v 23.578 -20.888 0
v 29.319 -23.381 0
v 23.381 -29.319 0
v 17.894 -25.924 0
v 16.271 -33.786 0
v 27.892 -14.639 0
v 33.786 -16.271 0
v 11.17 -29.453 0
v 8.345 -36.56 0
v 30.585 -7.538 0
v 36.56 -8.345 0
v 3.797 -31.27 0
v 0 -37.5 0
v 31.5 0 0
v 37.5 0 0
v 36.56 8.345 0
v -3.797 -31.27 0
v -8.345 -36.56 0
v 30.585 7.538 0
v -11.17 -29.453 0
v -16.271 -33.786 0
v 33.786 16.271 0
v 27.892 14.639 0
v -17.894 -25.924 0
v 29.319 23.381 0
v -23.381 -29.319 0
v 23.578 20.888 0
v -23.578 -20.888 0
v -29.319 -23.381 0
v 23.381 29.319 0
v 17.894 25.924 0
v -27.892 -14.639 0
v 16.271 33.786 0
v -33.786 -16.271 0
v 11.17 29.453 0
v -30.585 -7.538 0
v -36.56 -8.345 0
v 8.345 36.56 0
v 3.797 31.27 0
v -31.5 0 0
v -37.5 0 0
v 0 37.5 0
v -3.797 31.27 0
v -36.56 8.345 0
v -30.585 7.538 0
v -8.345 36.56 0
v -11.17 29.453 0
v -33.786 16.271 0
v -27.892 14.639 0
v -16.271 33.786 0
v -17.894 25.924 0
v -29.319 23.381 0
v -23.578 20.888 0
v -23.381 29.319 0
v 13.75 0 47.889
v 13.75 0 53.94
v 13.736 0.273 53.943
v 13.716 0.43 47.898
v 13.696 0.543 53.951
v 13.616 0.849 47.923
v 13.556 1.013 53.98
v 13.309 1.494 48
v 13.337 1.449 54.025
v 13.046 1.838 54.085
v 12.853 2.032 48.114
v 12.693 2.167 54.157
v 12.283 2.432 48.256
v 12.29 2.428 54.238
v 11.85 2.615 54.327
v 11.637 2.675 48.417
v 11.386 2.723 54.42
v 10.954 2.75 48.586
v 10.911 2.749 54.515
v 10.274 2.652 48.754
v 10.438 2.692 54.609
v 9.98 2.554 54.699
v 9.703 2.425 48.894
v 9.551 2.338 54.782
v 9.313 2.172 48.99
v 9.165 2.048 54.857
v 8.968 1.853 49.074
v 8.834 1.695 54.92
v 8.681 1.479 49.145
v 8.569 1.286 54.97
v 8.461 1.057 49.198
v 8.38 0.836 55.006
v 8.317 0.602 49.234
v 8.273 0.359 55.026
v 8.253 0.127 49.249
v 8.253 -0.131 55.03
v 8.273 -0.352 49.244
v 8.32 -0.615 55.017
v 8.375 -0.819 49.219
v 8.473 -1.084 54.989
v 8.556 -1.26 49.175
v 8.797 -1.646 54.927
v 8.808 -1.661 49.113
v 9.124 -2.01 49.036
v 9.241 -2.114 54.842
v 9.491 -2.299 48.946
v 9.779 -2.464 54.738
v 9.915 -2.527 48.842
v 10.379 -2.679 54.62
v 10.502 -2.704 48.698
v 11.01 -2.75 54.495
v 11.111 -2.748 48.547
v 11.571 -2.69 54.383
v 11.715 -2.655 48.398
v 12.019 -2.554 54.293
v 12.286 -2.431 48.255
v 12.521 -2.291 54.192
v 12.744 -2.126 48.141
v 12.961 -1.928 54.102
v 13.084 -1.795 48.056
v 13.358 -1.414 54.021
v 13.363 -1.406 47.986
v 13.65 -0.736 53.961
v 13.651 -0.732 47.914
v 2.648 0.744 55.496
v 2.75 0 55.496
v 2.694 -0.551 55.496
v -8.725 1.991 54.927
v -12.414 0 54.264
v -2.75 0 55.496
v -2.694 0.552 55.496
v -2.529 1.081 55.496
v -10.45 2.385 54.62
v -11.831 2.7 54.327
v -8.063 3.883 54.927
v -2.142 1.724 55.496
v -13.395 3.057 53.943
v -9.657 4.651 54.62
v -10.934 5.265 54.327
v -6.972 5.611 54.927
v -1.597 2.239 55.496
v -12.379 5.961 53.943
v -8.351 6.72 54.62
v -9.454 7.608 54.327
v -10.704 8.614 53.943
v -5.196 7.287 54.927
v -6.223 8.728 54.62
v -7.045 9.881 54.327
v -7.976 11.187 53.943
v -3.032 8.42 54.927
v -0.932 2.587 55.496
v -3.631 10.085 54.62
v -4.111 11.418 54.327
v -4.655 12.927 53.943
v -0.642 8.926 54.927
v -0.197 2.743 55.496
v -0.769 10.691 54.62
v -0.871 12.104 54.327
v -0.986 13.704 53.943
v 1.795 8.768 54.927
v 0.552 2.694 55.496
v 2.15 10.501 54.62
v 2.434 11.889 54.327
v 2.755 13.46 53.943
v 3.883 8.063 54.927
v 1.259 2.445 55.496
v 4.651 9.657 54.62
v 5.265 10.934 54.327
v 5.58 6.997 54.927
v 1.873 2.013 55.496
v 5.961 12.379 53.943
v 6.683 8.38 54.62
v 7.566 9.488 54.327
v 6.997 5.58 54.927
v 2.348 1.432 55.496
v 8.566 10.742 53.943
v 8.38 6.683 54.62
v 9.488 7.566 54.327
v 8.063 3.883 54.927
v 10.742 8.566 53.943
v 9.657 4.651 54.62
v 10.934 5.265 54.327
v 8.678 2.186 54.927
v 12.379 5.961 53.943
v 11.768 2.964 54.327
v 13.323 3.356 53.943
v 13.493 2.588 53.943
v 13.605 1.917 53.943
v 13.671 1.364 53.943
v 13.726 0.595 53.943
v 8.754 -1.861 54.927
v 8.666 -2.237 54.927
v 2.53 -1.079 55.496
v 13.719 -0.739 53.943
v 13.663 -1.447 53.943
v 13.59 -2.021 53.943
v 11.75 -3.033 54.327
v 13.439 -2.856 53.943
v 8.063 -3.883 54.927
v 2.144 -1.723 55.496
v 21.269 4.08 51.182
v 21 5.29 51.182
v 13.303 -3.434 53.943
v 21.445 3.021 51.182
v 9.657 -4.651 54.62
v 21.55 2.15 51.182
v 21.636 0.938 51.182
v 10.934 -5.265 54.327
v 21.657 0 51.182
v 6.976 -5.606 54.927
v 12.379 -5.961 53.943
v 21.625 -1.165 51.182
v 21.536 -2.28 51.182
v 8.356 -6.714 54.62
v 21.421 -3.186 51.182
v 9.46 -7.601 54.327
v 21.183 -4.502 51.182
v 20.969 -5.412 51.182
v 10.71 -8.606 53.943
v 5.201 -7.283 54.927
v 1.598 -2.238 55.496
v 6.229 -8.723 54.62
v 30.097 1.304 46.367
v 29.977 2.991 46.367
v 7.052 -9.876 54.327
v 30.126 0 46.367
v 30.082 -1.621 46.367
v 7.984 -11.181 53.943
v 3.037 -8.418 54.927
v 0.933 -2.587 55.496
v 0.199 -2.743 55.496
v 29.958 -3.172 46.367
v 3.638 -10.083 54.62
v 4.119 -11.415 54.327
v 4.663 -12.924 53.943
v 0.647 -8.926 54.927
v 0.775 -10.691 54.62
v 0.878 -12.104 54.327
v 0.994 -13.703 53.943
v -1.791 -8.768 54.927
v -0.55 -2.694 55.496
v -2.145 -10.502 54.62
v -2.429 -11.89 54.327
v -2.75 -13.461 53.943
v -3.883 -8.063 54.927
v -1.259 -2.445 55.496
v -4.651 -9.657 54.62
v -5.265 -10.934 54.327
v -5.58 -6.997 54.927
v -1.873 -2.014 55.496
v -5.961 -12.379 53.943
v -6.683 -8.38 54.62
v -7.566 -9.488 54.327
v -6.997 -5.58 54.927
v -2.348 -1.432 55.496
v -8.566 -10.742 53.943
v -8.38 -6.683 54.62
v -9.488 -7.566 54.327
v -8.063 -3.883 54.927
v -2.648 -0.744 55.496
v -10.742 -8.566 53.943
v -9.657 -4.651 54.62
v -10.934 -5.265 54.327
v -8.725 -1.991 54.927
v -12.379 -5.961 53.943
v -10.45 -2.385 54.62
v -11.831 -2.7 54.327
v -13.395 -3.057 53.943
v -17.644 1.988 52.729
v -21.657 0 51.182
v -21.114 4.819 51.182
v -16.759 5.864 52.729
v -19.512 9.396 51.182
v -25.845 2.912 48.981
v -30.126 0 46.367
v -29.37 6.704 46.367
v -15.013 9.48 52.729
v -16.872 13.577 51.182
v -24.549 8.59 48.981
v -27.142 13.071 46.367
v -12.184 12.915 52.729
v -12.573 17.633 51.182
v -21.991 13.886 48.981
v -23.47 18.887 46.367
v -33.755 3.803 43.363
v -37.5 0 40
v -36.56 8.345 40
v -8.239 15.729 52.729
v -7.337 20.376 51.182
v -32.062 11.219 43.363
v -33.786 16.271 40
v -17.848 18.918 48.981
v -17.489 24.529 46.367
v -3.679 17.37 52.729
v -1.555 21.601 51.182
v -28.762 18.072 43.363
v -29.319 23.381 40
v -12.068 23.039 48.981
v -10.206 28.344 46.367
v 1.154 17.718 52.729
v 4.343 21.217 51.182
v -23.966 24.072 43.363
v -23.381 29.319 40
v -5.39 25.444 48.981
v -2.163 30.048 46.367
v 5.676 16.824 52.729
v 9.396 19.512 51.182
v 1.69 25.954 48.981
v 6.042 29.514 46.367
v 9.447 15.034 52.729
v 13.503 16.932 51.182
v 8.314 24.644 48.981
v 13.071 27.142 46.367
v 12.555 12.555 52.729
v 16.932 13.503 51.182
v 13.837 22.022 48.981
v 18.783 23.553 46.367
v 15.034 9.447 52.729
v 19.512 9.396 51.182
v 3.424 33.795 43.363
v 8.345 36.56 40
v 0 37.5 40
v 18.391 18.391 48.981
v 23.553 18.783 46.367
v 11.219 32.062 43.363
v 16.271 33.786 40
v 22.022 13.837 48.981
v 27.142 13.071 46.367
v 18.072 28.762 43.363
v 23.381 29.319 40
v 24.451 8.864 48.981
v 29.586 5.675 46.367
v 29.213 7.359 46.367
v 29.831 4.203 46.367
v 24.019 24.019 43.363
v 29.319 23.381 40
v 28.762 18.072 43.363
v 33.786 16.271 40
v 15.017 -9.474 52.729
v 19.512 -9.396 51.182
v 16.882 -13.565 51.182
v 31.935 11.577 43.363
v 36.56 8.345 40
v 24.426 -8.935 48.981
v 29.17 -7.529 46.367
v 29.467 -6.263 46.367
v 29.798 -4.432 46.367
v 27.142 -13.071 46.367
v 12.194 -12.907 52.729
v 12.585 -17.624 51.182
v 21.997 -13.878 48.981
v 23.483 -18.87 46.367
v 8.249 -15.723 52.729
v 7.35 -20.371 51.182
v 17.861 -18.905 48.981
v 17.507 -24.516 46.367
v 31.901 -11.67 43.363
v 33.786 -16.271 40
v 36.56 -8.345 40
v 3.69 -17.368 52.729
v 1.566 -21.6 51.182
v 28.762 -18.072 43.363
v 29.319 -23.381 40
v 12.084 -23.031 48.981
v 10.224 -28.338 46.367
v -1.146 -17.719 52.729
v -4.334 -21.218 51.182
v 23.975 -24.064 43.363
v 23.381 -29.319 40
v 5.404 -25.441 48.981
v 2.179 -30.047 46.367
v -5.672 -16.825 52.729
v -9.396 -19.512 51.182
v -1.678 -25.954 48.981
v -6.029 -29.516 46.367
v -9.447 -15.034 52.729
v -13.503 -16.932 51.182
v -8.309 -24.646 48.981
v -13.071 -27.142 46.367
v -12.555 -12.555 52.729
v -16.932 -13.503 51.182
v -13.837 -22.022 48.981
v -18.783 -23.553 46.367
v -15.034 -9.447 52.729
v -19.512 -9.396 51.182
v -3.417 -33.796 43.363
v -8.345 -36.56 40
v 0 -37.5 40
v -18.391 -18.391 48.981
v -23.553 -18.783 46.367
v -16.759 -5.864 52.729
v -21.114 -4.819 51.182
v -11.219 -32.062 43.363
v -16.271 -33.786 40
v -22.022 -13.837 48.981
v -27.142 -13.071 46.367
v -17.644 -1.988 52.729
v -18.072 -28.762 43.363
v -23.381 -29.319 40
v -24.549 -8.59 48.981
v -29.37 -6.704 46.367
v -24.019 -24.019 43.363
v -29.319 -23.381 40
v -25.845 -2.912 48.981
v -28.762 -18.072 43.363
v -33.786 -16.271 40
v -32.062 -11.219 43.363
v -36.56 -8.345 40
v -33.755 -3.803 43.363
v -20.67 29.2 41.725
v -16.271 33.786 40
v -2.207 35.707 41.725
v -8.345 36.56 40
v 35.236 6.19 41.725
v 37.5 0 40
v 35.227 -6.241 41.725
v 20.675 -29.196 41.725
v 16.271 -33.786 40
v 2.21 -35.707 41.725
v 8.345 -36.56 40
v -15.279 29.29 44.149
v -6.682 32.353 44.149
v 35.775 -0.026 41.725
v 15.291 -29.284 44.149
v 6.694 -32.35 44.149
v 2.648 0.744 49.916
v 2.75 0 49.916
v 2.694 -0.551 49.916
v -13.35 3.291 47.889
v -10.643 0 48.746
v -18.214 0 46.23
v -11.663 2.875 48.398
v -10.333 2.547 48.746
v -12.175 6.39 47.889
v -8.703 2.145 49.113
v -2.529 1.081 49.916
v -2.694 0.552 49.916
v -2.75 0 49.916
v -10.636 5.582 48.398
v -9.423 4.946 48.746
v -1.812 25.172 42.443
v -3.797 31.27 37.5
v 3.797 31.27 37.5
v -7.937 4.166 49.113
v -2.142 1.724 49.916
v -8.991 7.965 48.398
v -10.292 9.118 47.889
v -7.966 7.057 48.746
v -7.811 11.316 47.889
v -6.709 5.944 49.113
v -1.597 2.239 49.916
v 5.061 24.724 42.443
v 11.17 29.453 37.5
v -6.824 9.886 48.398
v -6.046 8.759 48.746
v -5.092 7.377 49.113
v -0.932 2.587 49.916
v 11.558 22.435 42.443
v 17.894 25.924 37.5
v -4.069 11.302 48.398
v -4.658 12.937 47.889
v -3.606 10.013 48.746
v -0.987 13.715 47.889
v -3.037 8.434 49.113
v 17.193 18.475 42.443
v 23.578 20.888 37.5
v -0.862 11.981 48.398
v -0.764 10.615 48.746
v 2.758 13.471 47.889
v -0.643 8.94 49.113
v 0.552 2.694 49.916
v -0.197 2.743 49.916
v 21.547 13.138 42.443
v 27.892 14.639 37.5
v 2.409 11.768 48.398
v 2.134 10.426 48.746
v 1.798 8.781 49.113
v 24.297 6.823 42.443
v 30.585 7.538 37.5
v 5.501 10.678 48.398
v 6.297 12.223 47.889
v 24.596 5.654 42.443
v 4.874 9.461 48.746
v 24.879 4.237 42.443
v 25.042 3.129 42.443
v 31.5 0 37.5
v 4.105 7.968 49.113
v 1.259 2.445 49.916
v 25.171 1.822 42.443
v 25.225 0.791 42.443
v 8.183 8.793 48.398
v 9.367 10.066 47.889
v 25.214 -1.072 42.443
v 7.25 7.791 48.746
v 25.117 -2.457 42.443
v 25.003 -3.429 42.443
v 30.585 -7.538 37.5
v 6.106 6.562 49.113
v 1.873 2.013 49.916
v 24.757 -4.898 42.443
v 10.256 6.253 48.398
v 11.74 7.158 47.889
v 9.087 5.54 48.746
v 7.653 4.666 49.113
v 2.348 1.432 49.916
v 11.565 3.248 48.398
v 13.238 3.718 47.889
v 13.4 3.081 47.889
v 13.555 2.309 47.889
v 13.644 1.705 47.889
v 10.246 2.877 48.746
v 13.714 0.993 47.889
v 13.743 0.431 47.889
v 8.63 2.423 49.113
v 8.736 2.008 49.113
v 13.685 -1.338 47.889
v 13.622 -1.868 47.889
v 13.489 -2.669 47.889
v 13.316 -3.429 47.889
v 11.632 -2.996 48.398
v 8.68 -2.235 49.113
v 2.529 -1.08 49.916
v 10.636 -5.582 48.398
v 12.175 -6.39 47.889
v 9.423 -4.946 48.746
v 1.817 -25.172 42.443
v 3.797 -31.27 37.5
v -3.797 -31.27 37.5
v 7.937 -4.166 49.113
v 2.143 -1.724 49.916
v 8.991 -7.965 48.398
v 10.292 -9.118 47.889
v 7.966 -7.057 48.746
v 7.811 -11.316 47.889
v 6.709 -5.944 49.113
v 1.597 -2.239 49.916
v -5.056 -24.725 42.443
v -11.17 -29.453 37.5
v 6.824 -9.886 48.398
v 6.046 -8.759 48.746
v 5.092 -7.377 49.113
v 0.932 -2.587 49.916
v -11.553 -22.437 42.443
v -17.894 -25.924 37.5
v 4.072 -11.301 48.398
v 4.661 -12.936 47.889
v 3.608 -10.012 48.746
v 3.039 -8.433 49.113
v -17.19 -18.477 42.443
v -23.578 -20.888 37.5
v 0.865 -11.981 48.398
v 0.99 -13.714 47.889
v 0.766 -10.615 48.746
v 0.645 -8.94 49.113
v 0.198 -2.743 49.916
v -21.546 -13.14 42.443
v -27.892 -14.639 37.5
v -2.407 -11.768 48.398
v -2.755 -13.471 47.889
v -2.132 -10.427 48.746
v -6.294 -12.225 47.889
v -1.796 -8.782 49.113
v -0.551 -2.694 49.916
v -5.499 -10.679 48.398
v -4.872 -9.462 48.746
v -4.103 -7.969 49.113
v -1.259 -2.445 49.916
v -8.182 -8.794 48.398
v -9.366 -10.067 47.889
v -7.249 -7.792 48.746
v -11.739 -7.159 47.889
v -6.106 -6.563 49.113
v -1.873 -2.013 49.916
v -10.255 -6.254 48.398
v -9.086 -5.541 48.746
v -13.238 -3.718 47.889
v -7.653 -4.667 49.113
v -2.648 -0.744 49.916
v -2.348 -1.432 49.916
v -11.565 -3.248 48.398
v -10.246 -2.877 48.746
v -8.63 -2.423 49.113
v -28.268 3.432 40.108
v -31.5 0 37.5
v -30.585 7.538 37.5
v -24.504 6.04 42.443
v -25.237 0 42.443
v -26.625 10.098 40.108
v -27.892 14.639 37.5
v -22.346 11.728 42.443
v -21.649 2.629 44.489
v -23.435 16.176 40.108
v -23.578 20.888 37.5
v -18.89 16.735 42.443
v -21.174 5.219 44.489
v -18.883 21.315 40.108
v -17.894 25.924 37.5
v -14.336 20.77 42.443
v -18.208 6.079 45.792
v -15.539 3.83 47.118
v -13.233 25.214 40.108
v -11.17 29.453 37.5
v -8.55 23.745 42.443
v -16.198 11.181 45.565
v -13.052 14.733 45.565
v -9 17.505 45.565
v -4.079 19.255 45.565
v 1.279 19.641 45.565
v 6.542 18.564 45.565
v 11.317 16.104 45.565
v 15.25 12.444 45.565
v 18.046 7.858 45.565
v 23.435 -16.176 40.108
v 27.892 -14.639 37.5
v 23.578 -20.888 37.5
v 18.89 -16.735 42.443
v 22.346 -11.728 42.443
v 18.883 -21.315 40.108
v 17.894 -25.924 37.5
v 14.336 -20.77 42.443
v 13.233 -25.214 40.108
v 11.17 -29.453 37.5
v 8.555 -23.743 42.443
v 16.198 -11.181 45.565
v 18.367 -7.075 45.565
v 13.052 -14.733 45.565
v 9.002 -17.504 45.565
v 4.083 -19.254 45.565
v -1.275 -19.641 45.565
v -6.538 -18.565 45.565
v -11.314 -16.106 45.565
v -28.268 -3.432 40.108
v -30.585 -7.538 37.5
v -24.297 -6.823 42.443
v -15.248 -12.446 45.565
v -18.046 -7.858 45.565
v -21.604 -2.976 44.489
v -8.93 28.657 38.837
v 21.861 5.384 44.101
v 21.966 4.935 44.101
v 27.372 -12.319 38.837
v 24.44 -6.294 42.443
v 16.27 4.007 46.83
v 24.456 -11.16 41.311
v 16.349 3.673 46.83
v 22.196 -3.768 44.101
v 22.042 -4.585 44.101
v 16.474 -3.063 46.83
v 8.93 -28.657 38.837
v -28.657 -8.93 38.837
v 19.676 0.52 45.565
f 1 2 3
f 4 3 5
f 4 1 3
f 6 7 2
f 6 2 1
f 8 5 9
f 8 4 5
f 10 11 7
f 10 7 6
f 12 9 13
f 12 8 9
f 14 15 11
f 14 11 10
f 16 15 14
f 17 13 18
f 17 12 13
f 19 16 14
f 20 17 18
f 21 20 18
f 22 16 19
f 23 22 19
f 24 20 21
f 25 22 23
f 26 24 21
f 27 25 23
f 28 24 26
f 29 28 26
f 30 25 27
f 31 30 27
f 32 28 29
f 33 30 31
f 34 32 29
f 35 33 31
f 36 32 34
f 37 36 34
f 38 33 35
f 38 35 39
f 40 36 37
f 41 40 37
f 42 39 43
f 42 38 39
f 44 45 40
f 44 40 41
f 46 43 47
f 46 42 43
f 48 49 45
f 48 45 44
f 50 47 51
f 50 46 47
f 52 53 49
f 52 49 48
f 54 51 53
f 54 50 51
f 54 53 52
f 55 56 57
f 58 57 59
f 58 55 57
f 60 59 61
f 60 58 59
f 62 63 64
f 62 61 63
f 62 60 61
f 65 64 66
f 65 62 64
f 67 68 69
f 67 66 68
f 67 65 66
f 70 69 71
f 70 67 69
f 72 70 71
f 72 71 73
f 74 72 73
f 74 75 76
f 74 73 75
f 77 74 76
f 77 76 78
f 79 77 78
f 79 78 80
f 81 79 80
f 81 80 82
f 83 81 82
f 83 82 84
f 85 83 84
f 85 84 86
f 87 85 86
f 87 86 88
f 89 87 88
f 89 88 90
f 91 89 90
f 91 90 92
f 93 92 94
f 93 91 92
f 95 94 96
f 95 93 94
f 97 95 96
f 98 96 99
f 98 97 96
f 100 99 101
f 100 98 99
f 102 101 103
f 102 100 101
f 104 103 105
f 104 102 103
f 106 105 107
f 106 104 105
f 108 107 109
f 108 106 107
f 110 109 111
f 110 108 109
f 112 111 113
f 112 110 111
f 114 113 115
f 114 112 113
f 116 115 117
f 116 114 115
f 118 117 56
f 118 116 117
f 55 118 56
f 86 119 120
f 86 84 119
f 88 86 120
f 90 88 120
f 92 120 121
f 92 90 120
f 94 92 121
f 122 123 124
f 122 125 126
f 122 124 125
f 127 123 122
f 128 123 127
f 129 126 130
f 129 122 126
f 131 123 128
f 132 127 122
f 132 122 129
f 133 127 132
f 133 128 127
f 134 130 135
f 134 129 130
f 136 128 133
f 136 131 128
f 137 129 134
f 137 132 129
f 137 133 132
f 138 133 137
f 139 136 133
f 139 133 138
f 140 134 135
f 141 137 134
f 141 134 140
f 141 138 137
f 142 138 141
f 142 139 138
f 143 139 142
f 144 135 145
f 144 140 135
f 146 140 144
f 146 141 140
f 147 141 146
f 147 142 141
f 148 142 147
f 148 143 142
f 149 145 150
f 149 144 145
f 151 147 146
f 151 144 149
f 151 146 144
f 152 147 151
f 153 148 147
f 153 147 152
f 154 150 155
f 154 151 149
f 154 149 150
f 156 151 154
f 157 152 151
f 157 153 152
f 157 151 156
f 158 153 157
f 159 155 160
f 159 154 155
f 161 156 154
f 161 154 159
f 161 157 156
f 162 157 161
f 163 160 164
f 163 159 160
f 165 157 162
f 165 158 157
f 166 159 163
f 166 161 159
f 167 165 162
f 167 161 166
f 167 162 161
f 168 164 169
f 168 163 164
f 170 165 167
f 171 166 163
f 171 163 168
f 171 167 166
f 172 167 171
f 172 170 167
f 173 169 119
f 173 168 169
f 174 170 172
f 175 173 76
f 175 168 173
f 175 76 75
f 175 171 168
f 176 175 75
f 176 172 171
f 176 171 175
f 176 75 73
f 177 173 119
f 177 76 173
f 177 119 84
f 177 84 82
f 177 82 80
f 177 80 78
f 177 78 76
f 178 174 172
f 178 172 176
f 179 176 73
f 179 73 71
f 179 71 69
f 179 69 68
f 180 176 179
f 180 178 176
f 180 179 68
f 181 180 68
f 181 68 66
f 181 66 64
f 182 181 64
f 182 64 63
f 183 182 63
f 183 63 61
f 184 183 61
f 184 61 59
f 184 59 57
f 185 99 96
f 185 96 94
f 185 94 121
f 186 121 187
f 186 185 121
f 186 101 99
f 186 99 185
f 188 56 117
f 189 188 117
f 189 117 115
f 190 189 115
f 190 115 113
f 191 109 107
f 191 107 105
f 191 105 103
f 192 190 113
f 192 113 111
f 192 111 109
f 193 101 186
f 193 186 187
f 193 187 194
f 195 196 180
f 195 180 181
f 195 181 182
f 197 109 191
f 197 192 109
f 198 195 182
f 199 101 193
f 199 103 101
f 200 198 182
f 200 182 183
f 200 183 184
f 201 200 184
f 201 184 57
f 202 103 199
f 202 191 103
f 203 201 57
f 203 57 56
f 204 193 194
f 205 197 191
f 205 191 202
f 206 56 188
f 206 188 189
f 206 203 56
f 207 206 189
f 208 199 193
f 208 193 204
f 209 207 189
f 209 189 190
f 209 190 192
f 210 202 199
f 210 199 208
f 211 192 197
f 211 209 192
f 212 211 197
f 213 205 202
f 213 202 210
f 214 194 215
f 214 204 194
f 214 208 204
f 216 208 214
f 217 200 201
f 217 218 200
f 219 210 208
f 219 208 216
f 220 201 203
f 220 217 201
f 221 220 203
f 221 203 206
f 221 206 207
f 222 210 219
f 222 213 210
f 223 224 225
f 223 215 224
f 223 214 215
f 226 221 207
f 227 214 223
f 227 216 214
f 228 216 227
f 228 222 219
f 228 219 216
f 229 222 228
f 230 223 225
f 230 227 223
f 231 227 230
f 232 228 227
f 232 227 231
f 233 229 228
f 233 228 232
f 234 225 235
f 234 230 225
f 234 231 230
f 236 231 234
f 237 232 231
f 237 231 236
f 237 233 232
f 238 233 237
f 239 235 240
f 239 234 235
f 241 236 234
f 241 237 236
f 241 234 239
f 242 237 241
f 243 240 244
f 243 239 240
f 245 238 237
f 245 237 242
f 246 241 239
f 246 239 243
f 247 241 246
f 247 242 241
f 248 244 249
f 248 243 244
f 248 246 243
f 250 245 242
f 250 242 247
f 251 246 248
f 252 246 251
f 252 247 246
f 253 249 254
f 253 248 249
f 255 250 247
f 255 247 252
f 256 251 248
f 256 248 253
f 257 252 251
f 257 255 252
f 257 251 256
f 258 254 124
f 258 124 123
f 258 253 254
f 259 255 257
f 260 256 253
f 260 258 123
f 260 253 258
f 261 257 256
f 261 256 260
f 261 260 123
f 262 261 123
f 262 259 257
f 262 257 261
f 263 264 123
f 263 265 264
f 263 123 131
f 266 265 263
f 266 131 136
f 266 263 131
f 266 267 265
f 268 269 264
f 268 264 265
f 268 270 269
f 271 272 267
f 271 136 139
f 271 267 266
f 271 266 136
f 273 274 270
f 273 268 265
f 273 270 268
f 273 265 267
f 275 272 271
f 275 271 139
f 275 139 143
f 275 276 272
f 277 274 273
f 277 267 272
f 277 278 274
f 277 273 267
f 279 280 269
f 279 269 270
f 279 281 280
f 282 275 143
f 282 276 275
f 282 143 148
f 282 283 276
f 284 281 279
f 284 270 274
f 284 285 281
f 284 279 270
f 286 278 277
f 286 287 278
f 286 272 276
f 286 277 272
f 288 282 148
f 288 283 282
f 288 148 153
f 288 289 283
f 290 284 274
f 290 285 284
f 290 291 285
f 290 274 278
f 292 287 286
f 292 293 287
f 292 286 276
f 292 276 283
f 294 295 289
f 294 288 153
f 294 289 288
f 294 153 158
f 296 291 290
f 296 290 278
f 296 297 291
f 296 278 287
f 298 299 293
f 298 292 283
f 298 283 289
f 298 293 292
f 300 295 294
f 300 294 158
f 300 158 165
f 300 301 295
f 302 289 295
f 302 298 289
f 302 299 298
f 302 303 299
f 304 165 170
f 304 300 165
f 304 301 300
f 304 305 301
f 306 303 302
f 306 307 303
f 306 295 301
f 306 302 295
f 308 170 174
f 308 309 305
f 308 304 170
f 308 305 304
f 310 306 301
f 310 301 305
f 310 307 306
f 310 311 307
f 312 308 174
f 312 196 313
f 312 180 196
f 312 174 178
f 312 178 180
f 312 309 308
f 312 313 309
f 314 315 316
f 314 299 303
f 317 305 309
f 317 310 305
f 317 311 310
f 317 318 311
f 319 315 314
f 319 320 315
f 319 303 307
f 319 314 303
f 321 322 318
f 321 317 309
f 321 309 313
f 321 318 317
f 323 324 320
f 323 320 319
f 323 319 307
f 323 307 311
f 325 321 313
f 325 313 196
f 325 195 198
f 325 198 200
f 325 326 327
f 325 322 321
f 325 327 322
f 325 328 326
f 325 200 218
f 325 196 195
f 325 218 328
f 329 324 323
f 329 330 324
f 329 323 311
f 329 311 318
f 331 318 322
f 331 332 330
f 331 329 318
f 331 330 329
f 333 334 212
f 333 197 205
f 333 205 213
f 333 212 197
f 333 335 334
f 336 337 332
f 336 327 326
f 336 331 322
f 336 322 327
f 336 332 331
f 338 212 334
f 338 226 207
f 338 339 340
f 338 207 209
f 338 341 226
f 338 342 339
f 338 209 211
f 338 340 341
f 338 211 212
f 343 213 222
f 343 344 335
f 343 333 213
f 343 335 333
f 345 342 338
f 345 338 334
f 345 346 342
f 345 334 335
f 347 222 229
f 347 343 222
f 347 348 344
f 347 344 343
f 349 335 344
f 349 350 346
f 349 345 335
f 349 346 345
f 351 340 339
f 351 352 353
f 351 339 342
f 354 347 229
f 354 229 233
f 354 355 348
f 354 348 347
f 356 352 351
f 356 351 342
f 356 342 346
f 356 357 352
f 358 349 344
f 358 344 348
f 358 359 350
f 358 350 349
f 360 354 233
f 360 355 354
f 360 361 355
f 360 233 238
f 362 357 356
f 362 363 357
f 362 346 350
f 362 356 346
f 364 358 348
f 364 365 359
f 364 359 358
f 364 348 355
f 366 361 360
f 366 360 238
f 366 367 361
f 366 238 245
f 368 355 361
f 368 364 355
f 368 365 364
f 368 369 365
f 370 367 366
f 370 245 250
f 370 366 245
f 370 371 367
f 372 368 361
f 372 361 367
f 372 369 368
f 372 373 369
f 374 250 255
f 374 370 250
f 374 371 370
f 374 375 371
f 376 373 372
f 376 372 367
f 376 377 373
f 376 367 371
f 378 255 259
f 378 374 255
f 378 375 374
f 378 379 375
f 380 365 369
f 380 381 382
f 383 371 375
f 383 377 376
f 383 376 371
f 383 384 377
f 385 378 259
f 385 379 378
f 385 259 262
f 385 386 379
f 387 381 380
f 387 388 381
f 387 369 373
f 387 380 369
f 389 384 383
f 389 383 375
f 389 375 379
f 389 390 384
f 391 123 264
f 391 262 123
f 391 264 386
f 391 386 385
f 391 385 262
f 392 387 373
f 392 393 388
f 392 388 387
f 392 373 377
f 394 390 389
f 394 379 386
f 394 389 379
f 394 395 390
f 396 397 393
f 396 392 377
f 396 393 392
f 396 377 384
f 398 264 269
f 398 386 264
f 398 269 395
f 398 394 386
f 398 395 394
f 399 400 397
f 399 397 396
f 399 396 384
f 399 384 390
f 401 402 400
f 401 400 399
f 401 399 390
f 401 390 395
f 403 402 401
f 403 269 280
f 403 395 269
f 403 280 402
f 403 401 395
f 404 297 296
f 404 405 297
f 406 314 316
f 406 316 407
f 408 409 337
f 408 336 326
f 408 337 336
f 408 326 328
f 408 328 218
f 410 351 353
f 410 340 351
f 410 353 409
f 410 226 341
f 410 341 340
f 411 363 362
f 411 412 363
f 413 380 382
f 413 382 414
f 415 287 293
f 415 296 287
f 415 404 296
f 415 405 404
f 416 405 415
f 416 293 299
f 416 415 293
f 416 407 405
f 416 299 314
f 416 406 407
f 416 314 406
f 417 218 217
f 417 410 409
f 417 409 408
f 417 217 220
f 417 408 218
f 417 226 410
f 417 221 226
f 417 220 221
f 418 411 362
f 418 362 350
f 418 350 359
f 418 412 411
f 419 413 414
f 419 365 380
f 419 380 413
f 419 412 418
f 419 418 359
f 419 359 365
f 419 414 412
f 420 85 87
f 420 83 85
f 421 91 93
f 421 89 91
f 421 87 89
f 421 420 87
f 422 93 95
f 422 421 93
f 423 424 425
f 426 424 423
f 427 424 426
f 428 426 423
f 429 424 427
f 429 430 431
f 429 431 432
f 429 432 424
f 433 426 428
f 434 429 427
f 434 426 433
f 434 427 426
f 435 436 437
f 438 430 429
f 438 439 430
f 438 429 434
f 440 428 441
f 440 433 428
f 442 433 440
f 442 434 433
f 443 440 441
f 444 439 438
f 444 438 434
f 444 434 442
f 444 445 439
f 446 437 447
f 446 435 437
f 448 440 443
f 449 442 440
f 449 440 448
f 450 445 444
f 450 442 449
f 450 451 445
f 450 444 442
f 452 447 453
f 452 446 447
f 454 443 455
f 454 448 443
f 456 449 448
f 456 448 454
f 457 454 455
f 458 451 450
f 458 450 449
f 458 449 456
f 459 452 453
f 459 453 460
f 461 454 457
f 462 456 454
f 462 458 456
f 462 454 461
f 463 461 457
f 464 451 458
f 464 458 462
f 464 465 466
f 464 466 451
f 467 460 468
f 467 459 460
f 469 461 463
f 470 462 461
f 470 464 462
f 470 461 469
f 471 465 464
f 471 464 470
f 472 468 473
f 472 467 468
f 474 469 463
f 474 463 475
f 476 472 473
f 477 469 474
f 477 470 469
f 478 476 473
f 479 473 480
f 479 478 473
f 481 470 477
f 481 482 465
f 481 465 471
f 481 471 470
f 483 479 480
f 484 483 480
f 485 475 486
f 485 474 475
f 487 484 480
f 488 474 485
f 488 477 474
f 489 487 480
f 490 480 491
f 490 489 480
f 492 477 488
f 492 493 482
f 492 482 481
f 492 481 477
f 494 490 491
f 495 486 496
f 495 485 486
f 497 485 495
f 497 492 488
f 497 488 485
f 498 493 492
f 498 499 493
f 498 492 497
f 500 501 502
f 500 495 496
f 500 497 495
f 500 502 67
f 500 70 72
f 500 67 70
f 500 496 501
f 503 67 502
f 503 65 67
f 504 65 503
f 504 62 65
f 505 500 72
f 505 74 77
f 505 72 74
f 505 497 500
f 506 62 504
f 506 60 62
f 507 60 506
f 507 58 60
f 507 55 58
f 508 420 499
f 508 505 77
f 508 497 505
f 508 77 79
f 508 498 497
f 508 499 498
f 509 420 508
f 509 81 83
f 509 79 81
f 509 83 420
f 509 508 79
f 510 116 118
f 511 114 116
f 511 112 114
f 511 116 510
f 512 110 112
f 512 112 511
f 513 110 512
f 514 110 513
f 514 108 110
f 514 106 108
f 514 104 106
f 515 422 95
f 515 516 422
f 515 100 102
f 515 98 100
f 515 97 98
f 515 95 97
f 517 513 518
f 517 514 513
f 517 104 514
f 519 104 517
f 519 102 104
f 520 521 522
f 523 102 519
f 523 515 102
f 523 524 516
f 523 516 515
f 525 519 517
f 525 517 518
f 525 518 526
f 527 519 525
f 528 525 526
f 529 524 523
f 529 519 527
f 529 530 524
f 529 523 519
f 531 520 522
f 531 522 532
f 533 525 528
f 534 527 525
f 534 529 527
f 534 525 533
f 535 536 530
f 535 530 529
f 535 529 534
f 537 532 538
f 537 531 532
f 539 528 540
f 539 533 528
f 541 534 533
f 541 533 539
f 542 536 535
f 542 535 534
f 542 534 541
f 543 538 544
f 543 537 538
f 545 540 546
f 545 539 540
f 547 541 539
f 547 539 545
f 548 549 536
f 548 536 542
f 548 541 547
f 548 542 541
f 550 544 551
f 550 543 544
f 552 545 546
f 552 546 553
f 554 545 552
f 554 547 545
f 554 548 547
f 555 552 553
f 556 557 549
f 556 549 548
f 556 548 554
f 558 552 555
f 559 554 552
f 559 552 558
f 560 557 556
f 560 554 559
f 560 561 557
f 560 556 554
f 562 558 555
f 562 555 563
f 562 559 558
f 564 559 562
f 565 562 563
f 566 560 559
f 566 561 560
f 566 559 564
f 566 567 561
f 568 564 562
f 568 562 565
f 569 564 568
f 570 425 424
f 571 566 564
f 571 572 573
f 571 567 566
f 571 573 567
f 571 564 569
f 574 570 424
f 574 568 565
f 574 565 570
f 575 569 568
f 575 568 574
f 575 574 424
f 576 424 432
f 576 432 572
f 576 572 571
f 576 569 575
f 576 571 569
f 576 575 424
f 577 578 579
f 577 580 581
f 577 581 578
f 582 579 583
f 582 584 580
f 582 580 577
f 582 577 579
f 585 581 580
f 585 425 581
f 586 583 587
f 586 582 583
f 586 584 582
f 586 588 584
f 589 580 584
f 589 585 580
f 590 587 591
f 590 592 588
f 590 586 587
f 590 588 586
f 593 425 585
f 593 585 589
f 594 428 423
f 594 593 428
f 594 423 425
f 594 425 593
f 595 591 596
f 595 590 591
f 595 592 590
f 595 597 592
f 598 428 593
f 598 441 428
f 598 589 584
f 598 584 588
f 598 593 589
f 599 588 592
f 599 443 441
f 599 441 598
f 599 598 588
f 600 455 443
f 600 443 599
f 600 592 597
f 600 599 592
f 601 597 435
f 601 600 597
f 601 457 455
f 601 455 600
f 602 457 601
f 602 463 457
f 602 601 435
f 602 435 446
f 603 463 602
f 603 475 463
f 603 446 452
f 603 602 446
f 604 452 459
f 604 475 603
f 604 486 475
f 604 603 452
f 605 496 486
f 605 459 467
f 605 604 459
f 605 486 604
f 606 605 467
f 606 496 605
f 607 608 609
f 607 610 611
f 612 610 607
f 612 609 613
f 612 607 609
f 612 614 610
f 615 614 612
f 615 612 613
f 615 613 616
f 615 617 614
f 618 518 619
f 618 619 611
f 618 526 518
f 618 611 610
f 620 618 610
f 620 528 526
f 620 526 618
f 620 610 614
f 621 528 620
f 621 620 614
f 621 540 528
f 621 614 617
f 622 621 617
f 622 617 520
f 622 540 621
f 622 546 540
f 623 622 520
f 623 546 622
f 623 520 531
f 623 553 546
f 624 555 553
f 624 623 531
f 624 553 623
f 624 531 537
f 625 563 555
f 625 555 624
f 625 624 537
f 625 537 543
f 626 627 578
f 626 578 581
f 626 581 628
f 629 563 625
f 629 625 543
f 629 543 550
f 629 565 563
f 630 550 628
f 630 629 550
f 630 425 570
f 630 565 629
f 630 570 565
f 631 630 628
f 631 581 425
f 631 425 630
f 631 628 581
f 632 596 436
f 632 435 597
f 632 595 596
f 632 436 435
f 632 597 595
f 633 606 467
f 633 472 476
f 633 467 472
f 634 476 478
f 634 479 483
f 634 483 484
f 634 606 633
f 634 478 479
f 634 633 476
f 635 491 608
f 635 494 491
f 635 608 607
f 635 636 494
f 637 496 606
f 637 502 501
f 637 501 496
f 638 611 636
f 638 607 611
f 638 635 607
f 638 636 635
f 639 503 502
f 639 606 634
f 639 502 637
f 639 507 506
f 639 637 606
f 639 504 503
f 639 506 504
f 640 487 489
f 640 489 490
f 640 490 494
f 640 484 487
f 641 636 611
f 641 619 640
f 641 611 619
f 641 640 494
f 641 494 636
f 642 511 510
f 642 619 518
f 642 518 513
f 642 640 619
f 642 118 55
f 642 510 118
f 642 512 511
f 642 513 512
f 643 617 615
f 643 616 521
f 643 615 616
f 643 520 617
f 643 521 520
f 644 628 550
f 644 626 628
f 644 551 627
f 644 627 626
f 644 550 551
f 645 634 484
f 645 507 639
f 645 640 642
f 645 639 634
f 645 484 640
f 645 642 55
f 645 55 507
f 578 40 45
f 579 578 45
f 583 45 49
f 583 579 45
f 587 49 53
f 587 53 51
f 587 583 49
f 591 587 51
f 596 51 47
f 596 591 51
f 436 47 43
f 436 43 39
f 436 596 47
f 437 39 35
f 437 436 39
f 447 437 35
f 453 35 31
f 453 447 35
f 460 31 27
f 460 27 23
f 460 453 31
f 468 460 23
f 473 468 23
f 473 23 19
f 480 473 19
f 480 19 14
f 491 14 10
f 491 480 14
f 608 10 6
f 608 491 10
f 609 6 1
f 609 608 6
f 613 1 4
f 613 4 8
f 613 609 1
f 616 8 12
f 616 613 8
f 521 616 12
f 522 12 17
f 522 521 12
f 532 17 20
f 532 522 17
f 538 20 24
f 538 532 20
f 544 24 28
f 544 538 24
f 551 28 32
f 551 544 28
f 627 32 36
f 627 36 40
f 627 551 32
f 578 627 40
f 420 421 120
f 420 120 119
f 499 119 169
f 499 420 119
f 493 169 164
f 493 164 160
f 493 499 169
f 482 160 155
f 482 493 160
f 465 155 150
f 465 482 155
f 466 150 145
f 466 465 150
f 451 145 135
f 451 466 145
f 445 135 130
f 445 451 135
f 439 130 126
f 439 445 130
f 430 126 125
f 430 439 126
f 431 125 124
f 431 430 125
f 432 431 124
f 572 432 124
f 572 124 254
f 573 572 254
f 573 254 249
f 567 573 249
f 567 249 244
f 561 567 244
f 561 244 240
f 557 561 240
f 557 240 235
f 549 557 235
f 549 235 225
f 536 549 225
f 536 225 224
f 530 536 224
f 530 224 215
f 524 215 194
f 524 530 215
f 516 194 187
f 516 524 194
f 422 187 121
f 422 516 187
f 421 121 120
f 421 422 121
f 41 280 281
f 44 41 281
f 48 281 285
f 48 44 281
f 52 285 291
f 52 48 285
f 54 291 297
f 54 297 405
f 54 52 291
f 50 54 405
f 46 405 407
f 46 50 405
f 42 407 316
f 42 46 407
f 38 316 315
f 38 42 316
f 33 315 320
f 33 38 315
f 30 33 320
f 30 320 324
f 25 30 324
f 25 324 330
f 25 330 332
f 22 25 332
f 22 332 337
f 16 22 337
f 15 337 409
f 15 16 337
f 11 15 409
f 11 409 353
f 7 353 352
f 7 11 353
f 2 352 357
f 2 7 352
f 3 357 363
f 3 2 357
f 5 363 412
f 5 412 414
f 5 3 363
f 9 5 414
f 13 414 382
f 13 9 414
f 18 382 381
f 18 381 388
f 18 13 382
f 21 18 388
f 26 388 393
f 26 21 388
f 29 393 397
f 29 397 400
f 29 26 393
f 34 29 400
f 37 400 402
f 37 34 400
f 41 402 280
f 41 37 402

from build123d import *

# Parameters (mm, degrees)
F2_R     = 2.75
F3_DEPTH = 60
F4_R     = 2.75
F5_DEPTH = 60


with BuildPart() as f1:
    # F0 (on Front) → F1 (revolve)
    with BuildSketch(Plane.XZ):
        with BuildLine():
            Line((-37.5, 40), (-37.5, 0))
            Line((-37.5, 0), (-31.5, 0))
            Line((-31.5, 0), (-31.5, 37.5))
            ThreePointArc((-31.5, 37.5), (-16.943087, 46.756579), (0, 50))
            Line((0, 50), (0, 55.5))
            ThreePointArc((0, 55.5), (-20.393033, 51.72508), (-37.5, 40))
        make_face()
    revolve(axis=Axis((0, 0, -14.908669), (0, 0, -1)))

    # F2 (on Top) → F3 (cut)
    with BuildSketch(Plane.XY):
        Circle(F2_R)
    extrude(amount=F3_DEPTH, mode=Mode.SUBTRACT)

    # F4 (on Top) → F5 (cut)
    with BuildSketch(Plane.XY):
        with Locations((11, 0)):
            Circle(F4_R)
    extrude(amount=F5_DEPTH, mode=Mode.SUBTRACT)


solid = f1.part
